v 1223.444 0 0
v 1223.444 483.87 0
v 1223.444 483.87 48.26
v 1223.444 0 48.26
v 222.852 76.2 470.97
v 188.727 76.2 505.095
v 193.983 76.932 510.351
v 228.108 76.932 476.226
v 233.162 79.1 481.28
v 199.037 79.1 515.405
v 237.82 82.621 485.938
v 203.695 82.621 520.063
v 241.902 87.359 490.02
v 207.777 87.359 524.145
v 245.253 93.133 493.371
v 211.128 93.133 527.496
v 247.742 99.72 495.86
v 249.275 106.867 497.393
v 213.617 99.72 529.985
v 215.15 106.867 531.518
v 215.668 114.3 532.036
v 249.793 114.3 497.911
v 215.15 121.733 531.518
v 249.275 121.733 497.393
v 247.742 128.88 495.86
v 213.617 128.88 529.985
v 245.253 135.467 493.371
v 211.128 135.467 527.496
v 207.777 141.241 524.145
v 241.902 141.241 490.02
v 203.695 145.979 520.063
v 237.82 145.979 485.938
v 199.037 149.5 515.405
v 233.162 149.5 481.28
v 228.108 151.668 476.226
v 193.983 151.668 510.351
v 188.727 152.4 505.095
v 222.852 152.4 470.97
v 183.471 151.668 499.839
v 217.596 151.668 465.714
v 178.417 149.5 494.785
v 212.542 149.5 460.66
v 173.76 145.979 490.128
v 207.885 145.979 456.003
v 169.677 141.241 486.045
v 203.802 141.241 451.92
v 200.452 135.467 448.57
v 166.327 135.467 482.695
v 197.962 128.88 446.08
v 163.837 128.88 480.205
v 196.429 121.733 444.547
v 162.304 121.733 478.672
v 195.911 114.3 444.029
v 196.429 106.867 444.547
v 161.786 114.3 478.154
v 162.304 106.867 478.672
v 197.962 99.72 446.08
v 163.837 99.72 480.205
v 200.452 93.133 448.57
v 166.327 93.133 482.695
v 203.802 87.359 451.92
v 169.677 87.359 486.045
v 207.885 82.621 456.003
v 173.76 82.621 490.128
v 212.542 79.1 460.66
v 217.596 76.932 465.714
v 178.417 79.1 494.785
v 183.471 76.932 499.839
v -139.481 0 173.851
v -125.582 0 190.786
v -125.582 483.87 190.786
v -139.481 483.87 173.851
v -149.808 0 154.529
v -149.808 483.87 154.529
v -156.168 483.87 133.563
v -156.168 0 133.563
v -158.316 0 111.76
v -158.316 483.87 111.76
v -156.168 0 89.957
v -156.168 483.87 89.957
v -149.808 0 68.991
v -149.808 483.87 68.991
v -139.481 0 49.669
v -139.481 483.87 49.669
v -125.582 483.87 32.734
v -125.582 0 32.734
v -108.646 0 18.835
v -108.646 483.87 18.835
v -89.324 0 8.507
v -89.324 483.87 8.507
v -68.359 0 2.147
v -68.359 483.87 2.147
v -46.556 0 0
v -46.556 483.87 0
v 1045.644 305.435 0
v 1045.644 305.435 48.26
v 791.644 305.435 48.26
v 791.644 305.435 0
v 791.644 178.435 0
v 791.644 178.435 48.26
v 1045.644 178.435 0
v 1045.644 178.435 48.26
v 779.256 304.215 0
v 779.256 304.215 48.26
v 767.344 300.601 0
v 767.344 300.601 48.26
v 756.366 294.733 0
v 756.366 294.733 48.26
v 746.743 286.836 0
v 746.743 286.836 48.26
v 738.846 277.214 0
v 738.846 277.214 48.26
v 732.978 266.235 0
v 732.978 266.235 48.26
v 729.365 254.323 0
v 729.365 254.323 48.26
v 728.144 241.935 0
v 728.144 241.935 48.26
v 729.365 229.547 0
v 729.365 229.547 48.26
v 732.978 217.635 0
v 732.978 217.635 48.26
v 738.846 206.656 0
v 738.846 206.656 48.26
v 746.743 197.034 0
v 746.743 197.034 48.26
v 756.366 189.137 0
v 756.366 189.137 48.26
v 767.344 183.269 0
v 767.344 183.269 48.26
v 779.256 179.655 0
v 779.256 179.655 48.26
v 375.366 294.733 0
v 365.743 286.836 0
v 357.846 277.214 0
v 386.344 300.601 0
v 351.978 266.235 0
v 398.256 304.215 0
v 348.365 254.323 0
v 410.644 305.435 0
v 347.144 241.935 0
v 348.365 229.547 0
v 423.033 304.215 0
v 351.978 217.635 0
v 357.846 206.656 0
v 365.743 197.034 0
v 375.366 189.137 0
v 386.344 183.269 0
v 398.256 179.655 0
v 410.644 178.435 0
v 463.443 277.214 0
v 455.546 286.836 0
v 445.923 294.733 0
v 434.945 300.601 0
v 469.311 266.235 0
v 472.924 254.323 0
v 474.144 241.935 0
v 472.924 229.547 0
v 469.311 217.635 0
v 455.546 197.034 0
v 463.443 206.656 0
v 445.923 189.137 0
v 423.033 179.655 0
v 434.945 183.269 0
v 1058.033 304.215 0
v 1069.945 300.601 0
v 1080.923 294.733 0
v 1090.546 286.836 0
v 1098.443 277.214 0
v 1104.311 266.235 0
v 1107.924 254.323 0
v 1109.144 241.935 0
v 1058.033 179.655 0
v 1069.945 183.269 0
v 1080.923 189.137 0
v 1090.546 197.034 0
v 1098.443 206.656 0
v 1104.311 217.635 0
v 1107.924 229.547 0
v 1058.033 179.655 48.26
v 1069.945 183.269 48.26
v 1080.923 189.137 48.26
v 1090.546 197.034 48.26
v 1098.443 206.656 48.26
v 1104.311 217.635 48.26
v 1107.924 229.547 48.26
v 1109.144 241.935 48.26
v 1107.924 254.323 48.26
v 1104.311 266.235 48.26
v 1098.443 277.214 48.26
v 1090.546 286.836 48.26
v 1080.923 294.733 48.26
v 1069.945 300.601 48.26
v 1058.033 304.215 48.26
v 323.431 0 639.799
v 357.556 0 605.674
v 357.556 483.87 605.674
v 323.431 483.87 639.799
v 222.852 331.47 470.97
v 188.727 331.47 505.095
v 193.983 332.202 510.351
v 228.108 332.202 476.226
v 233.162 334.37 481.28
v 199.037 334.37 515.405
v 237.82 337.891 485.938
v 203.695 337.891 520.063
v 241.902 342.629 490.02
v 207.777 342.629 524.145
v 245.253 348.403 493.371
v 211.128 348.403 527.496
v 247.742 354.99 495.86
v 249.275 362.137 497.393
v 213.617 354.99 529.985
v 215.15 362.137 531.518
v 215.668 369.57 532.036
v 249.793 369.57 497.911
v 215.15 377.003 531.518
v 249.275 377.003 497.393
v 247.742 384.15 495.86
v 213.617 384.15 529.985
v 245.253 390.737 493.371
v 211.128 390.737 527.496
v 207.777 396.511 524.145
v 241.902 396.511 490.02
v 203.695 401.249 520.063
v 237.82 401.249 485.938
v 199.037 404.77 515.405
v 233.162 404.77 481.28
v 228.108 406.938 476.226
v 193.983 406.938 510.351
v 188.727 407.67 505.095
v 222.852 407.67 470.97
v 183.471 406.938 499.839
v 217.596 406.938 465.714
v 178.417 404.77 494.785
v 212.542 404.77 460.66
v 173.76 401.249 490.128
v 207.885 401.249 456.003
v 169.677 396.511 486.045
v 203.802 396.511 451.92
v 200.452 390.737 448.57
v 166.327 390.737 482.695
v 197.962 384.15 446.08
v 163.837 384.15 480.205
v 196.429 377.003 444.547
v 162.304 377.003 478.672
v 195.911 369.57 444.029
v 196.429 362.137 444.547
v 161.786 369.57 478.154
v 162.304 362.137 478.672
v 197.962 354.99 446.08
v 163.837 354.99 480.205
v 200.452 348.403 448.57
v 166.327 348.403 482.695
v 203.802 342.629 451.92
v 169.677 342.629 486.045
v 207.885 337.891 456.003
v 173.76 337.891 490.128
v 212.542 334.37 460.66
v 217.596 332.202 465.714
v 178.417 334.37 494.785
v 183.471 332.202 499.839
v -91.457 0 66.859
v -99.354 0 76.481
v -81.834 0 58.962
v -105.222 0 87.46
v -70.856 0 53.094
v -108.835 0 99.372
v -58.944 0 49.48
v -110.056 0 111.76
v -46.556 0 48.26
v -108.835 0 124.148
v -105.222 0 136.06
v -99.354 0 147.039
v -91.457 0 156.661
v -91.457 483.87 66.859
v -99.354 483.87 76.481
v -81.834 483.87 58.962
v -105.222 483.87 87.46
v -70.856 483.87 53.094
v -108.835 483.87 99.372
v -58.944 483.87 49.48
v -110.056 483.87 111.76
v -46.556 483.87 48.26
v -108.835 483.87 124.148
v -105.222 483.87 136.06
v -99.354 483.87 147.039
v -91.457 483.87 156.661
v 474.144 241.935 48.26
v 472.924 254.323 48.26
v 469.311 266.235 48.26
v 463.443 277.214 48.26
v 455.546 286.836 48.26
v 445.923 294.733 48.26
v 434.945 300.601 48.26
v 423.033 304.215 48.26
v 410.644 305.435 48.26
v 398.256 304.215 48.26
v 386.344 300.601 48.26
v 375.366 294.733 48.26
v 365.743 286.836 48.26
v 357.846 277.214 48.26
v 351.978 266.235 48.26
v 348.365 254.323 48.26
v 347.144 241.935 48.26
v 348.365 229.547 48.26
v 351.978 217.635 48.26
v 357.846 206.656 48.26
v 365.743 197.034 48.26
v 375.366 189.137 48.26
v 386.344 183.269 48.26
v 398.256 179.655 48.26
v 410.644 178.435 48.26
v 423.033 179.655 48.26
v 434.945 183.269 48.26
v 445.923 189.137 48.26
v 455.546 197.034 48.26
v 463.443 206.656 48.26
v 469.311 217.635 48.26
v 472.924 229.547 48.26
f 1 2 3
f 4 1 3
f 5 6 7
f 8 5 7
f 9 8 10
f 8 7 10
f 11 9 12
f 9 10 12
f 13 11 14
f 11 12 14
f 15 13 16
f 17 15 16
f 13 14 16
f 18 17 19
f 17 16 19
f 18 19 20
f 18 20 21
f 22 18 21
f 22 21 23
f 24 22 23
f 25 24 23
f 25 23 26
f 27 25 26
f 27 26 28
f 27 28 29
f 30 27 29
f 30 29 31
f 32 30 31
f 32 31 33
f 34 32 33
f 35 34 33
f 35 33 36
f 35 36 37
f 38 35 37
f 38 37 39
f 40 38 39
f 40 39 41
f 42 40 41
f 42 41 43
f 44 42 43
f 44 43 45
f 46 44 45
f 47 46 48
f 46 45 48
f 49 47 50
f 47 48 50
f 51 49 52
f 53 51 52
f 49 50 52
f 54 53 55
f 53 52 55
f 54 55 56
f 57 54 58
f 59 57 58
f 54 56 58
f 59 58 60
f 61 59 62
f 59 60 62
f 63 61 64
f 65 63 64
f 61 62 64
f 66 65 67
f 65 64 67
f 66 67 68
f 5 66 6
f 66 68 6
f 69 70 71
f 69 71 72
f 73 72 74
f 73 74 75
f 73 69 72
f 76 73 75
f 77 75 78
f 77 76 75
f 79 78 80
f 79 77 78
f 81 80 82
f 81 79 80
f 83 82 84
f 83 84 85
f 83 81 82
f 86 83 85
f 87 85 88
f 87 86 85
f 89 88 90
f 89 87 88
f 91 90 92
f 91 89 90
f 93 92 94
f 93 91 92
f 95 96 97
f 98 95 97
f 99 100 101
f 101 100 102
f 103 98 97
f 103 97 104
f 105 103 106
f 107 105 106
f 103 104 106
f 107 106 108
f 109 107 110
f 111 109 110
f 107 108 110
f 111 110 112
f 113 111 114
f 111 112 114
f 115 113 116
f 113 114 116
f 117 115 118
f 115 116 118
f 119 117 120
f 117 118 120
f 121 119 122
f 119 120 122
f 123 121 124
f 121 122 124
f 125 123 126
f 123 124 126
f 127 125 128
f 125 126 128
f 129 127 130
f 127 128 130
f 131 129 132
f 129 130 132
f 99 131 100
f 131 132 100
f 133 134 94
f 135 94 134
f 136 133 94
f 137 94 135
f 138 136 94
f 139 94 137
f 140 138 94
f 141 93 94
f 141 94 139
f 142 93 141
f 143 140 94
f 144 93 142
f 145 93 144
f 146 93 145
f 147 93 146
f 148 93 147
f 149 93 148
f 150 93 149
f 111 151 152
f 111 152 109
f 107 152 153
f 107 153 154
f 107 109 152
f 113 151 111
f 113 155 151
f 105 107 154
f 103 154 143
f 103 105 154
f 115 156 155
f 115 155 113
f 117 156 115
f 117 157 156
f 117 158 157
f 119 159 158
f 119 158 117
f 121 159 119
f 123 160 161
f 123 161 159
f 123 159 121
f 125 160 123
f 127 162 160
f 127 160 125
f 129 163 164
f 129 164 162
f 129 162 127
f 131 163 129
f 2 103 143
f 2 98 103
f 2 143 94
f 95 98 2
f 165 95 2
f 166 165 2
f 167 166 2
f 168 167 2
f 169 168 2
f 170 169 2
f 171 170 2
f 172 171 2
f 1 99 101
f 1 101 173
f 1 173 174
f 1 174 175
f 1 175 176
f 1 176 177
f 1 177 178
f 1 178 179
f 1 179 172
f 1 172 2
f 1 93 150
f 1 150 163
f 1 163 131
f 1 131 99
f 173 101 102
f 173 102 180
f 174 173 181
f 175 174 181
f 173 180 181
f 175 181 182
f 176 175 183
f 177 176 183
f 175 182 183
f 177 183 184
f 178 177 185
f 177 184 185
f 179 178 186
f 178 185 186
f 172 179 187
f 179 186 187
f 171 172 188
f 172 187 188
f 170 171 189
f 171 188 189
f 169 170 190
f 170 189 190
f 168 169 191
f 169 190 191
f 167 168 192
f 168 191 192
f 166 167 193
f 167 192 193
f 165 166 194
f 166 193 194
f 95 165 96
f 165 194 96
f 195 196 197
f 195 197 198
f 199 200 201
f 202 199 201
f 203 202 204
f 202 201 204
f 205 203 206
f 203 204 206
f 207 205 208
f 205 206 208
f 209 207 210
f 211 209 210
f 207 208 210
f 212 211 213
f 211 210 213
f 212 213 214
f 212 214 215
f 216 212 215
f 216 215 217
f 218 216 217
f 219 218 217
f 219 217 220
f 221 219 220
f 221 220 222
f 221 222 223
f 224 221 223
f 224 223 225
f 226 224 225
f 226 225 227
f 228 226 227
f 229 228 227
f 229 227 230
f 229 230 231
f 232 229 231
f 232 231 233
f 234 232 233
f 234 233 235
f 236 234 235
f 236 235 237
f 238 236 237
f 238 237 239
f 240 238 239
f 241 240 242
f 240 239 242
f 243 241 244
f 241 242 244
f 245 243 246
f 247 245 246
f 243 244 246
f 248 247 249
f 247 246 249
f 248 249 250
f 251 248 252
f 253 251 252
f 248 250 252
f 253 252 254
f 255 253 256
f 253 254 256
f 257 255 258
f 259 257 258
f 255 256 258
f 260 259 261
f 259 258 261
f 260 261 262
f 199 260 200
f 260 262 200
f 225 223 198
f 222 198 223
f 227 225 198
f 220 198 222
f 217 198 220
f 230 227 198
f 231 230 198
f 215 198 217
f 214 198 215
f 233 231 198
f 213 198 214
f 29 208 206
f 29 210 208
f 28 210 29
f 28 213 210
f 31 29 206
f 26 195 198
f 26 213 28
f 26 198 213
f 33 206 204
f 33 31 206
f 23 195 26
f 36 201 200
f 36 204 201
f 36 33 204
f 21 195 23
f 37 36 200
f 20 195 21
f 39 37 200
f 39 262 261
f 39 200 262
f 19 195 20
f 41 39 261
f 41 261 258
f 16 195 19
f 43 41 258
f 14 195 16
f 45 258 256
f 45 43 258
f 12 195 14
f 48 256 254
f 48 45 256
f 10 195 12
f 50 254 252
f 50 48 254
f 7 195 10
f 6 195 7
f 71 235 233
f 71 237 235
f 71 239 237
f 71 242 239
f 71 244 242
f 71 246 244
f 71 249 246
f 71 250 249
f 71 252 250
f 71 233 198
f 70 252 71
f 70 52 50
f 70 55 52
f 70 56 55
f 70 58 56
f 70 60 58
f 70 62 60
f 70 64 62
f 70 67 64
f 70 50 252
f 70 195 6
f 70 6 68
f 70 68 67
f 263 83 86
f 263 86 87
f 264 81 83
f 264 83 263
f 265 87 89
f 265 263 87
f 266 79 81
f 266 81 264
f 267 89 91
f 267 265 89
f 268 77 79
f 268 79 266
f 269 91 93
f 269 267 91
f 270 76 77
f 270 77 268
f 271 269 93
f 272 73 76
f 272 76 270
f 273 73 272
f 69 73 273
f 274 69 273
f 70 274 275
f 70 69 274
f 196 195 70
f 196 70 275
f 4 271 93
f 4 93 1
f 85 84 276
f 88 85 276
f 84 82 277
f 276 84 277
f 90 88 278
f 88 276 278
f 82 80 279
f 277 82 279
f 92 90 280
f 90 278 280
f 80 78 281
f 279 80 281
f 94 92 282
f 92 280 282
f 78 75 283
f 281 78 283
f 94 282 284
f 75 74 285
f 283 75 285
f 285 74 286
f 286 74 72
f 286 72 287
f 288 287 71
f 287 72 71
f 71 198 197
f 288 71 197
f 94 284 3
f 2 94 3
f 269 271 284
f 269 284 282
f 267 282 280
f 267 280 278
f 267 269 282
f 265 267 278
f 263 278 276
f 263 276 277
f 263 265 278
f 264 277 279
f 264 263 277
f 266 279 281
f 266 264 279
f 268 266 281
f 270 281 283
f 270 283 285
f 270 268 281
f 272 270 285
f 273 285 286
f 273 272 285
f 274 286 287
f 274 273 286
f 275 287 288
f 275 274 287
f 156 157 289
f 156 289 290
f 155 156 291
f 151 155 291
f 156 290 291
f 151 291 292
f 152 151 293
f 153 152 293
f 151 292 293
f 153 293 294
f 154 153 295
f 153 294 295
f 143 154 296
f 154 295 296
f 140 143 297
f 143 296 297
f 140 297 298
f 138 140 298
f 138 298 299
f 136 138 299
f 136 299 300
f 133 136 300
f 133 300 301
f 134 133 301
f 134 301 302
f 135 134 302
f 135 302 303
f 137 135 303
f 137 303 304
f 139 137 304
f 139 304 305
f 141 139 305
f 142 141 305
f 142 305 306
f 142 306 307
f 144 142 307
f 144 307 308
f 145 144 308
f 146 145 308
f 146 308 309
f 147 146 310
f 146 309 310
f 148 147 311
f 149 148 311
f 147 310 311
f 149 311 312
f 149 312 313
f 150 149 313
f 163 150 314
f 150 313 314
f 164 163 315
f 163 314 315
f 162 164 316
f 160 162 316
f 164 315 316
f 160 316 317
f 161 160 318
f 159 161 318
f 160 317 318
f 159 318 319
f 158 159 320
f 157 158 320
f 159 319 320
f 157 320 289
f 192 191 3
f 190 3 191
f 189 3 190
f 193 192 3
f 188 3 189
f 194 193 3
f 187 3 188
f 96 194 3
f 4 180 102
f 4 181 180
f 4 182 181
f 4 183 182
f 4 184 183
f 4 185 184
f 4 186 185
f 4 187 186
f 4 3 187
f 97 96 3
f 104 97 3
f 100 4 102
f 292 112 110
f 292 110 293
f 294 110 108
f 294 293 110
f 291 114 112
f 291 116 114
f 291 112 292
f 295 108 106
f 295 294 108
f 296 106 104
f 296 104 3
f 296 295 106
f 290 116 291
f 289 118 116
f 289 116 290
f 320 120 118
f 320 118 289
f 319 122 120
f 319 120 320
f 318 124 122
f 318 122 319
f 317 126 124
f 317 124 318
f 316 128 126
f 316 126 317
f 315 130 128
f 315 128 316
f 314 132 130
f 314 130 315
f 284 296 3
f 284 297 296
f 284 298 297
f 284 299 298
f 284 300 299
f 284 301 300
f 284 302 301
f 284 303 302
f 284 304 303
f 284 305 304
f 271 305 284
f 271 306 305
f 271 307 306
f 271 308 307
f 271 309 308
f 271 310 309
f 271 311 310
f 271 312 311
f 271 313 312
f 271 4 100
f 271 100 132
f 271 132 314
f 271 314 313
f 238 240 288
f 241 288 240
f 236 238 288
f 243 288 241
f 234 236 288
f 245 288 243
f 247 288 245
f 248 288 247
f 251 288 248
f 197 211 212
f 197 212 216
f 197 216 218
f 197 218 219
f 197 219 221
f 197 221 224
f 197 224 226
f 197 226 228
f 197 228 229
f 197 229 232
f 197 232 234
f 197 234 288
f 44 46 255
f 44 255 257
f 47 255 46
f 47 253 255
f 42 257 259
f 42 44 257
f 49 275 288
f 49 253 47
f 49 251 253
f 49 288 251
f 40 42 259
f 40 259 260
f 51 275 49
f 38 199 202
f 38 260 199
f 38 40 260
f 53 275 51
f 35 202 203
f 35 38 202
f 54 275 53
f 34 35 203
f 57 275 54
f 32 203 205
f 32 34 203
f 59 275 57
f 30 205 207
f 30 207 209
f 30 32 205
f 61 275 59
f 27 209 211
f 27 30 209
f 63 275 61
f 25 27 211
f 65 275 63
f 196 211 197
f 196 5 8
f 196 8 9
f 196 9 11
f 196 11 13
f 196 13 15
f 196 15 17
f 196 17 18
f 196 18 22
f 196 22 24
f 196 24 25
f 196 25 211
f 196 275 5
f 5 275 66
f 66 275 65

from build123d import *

# Parameters (mm, degrees)
F1_DEPTH = 483.87
F3_DEPTH = 76.2
F4_R     = 38.1
F5_DEPTH = 50.8
F2_R     = 63.5
F6_DEPTH = 50.8


with BuildPart() as f1:
    # F0 (on Front) → F1 (new body)
    with BuildSketch(Plane.XZ):
        with BuildLine():
            Line((323.430955, 639.79906), (-125.581851, 190.786254))
            ThreePointArc((-125.581851, 190.786254), (-149.808374, 68.9913), (-46.555597, 0))
            Line((-46.555597, 0), (1223.444403, 0))
            Line((1223.444403, 0), (1223.444403, 48.26))
            Line((1223.444403, 48.26), (-46.555597, 48.26))
            ThreePointArc((-46.555597, 48.26), (-105.221948, 87.459602), (-91.456878, 156.661281))
            Line((-91.456878, 156.661281), (357.555928, 605.674087))
            Line((357.555928, 605.674087), (323.430955, 639.79906))
        make_face()
    extrude(amount=-F1_DEPTH)

    # F2 (on face) → F3 (cut)
    with BuildSketch(Plane.XY.offset(48.26)):
        with BuildLine():
            Line((791.644403, 178.435), (1045.644403, 178.435))
            ThreePointArc((1045.644403, 178.435), (1109.144403, 241.935), (1045.644403, 305.435))
            Line((1045.644403, 305.435), (791.644403, 305.435))
            ThreePointArc((791.644403, 305.435), (728.144403, 241.935), (791.644403, 178.435))
        make_face()
    extrude(amount=-F3_DEPTH, mode=Mode.SUBTRACT)

    # F4 (on face) → F5 (cut)
    with BuildSketch(Plane(origin=(-158.184053, 0, 158.184053), x_dir=(0, -1, 0), z_dir=(-0.707107, 0, 0.707107))):
        with Locations((-369.57, 490.606475)):
            Circle(F4_R)
        with Locations((-114.3, 490.606475)):
            Circle(F4_R)
    extrude(amount=-F5_DEPTH, mode=Mode.SUBTRACT)

    # F2 (on face) → F6 (cut)
    with BuildSketch(Plane.XY.offset(48.26)):
        with Locations((410.644403, 241.935)):
            Circle(F2_R)
    extrude(amount=-F6_DEPTH, mode=Mode.SUBTRACT)


solid = f1.part
